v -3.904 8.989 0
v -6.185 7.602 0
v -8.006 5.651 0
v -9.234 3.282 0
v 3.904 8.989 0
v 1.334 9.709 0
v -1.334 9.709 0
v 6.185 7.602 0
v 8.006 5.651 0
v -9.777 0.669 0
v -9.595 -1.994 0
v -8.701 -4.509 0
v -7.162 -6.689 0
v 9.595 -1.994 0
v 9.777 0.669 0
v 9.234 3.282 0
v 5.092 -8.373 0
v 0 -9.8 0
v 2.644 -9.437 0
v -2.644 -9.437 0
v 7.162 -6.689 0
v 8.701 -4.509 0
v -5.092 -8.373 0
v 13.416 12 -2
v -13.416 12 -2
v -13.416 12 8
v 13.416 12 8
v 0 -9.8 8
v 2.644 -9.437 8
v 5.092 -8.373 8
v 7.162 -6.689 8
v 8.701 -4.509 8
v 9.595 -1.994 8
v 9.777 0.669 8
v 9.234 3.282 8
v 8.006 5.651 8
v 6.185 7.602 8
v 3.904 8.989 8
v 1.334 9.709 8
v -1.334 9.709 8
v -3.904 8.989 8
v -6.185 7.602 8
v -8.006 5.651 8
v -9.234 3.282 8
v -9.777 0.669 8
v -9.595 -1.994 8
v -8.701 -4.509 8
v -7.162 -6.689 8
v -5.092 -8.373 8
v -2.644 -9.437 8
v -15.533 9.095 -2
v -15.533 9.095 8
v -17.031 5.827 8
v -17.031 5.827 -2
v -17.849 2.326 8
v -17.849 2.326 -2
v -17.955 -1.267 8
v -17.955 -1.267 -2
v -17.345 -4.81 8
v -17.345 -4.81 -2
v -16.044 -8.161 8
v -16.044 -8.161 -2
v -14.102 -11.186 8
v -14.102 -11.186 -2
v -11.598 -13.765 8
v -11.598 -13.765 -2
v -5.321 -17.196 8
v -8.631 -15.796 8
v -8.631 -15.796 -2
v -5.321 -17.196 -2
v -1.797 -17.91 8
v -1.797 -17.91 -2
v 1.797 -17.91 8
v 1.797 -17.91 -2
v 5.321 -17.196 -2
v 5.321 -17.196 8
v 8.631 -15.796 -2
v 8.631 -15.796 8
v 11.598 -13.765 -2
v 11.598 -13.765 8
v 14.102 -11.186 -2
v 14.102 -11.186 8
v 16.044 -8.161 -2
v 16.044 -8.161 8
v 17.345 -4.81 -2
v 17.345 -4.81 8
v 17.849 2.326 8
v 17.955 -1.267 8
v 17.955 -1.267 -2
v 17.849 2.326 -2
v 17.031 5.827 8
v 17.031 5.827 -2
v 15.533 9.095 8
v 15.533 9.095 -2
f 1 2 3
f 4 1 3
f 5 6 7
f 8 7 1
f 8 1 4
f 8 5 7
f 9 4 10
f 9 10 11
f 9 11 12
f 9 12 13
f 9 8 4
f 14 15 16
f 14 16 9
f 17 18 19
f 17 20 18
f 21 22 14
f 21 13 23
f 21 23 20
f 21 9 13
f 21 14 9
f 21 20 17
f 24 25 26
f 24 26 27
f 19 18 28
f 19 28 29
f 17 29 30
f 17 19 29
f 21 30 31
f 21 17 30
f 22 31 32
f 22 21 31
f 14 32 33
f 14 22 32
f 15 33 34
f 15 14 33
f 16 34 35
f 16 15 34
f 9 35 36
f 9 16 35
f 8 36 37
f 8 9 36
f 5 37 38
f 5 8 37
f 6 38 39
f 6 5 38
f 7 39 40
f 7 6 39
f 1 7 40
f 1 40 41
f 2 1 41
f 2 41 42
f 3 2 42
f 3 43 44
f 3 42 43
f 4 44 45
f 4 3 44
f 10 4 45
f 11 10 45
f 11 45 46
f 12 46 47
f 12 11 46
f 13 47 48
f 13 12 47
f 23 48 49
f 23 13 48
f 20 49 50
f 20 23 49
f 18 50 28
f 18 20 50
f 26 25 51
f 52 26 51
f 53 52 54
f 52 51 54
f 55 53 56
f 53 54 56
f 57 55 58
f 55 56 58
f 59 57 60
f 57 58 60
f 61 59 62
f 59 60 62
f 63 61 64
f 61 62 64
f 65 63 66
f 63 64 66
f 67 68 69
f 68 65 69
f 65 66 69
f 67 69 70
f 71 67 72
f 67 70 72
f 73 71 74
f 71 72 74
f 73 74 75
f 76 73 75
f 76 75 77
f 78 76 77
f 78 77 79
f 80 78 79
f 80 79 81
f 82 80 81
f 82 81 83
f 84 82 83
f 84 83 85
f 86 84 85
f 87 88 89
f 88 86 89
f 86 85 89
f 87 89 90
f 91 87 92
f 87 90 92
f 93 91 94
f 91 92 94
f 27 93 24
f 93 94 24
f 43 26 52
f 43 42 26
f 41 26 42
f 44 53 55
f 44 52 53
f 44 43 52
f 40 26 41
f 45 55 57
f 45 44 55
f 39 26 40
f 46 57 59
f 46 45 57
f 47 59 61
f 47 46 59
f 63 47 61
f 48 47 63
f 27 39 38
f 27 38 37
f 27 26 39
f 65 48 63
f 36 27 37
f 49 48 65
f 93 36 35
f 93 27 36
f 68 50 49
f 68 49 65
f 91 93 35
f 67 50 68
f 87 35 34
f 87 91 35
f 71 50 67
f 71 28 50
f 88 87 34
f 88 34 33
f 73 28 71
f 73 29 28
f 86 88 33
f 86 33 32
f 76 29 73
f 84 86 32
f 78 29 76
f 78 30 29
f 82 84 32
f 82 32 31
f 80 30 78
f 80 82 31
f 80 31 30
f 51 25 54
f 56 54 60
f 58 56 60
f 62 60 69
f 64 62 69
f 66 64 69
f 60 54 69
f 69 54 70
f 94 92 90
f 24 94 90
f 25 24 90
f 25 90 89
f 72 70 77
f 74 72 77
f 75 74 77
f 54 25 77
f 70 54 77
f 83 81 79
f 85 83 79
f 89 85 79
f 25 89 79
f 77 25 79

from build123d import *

# Parameters (mm, degrees)
BOX002_W               = 10
BOX002_H               = 35
BOX002_DEPTH           = 15
CYLINDER015_R          = 9.8
CYLINDER015_DEPTH      = 110
CYLINDER014_R          = 18
CYLINDER014_DEPTH      = 10
CUT003_PLACEMENT_ANGLE = 90


with BuildPart() as cube002:
    # Box002 → Box002 (new body)
    with BuildSketch(Plane(origin=(-22, -18.5, -3), x_dir=(1, 0, 0), z_dir=(0, 0, 1))):
        with Locations((5, 17.5)):
            Rectangle(BOX002_W, BOX002_H)
    extrude(amount=BOX002_DEPTH)


with BuildPart() as main_axis002:
    # Cylinder015 → Cylinder015 (new body)
    with BuildSketch(Plane.XY):
        Circle(CYLINDER015_R)
    extrude(amount=CYLINDER015_DEPTH)


with BuildPart() as main_axis_holder:
    # Cylinder014 → Cylinder014 (new body)
    with BuildSketch(Plane.XY.offset(-2)):
        Circle(CYLINDER014_R)
    extrude(amount=CYLINDER014_DEPTH)

    # Cut002: cut main_axis002
    add(main_axis002.part, mode=Mode.SUBTRACT)

    # Cut003: cut Cube002
    add(cube002.part, mode=Mode.SUBTRACT)


with BuildPart() as main_axis_holder_1:
    # Cut003 placement: moved
    add(main_axis_holder.part.rotate(Axis((0, 0, 0), (0, 0, -1)), CUT003_PLACEMENT_ANGLE))


solid = main_axis_holder_1.part
